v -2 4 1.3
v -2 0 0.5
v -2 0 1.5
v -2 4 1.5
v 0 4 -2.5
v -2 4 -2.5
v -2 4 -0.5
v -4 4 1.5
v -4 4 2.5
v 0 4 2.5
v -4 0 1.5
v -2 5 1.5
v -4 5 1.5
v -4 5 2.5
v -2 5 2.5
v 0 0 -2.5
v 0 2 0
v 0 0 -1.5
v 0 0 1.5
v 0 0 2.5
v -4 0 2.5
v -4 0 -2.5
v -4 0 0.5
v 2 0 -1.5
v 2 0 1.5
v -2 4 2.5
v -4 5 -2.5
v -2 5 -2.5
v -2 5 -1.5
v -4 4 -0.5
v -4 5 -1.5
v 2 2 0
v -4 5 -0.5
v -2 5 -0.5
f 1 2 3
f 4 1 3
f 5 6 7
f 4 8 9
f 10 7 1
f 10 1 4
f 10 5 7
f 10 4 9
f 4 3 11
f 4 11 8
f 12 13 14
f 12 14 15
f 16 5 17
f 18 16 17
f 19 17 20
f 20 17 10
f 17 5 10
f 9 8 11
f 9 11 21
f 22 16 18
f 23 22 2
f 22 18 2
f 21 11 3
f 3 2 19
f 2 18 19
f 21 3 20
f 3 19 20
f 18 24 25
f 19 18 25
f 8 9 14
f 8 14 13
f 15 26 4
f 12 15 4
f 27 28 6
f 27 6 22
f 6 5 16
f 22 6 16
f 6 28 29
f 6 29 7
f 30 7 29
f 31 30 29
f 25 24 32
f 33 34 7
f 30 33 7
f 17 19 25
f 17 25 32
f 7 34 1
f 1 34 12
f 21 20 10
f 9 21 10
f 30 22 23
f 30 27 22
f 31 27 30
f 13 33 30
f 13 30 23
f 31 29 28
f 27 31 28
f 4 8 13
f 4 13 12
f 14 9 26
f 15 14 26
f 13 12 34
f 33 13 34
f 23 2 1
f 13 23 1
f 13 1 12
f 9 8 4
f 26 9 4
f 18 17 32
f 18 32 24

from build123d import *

# Parameters (mm, degrees)
BOSS_EXTRUDE1_DEPTH = 2
SKETCH2_W           = 5
SKETCH2_H           = 4
BOSS_EXTRUDE2_DEPTH = 2
SKETCH3_W           = 1
SKETCH3_H           = 4
BOSS_EXTRUDE3_DEPTH = 2
SKETCH5_W           = 2
SKETCH5_H           = 1
BOSS_EXTRUDE8_DEPTH = 1


with BuildPart() as part:
    # Sketch1 → Boss-Extrude1 (new body)
    with BuildSketch(Plane(origin=(0, 0, 0), x_dir=(0, 0, -1), z_dir=(1, 0, 0))):
        Polygon((-1.5, 0), (0, 2), (1.5, 0), align=None)
    extrude(amount=BOSS_EXTRUDE1_DEPTH)

    # Sketch2 → Boss-Extrude2 (add)
    with BuildSketch(Plane.ZY):
        with Locations((0, 2)):
            Rectangle(SKETCH2_W, SKETCH2_H)
    extrude(amount=BOSS_EXTRUDE2_DEPTH)

    # Sketch3 → Boss-Extrude3 (add)
    with BuildSketch(Plane.ZY.offset(2)):
        Polygon((-2.5, 0), (0.5, 0), (1.3, 4), (-0.5, 4), (-2.5, 4), align=None)
        Polygon((-2.5, 4), (-0.5, 4), (-1.5, 5), (-2.5, 5), align=None)
        Polygon((1.3, 4), (1.5, 5), (-0.5, 5), (-0.5, 4), align=None)
        with Locations((2, 2)):
            Rectangle(SKETCH3_W, SKETCH3_H)
    extrude(amount=BOSS_EXTRUDE3_DEPTH)


with BuildPart() as body_2:
    # Sketch5 → Boss-Extrude8 (new body)
    with BuildSketch(Plane(origin=(0, 4, 0), x_dir=(1, 0, 0), z_dir=(0, 1, 0))):
        with Locations((-3, -2)):
            Rectangle(SKETCH5_W, SKETCH5_H)
    extrude(amount=BOSS_EXTRUDE8_DEPTH)


solid = Compound([part.part, body_2.part])
